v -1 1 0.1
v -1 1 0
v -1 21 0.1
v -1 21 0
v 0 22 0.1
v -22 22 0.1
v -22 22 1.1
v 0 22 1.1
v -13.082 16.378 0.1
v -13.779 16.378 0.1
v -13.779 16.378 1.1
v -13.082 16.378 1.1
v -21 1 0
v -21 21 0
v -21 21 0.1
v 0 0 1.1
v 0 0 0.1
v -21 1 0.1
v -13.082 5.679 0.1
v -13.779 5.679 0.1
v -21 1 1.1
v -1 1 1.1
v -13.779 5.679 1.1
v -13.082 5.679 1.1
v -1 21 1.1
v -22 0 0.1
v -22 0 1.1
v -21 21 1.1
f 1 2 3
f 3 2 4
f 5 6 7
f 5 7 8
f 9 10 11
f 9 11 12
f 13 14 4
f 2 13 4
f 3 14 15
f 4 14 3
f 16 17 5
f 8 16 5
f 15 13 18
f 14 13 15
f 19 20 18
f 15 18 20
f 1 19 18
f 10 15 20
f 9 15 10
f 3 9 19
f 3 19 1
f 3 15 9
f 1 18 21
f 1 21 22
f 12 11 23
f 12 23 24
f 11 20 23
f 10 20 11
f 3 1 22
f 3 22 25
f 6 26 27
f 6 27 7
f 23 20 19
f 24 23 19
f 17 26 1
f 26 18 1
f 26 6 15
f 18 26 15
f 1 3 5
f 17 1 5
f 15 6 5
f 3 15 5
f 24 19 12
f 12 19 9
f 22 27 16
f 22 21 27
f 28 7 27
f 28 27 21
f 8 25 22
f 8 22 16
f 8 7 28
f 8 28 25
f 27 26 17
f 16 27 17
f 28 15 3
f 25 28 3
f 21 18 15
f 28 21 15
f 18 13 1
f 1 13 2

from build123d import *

# Parameters (mm, degrees)
SZKIC1_W                    = 20
SZKIC1_H                    = 20
DODANIE_WYCI_GNI_CIE1_DEPTH = 0.1
SZKIC2_W                    = 22
SZKIC2_H                    = 22
SZKIC2_W_2                  = 20
SZKIC2_H_2                  = 20
DODANIE_WYCI_GNI_CIE2_DEPTH = 1
SZKIC3_W                    = 0.696708677
SZKIC3_H                    = 10.699032121
DODANIE_WYCI_GNI_CIE3_DEPTH = 1


with BuildPart() as part:
    # Szkic1 → Dodanie-wyciągnięcie1 (new body)
    with BuildSketch(Plane.XY):
        with Locations((-11, 11)):
            Rectangle(SZKIC1_W, SZKIC1_H)
    extrude(amount=DODANIE_WYCI_GNI_CIE1_DEPTH)

    # Szkic3 → Dodanie-wyciągnięcie3 (add)
    with BuildSketch(Plane.XY.offset(0.1)):
        with Locations((-13.430215504, 11.028166078)):
            Rectangle(SZKIC3_W, SZKIC3_H)
    extrude(amount=DODANIE_WYCI_GNI_CIE3_DEPTH)


with BuildPart() as body_2:
    # Szkic2 → Dodanie-wyciągnięcie2 (new body)
    with BuildSketch(Plane.XY.offset(0.1)):
        with Locations((-11, 11)):
            Rectangle(SZKIC2_W, SZKIC2_H)
        with Locations((-11, 11)):
            Rectangle(SZKIC2_W_2, SZKIC2_H_2, mode=Mode.SUBTRACT)
    extrude(amount=DODANIE_WYCI_GNI_CIE2_DEPTH)


solid = Compound([part.part, body_2.part])
